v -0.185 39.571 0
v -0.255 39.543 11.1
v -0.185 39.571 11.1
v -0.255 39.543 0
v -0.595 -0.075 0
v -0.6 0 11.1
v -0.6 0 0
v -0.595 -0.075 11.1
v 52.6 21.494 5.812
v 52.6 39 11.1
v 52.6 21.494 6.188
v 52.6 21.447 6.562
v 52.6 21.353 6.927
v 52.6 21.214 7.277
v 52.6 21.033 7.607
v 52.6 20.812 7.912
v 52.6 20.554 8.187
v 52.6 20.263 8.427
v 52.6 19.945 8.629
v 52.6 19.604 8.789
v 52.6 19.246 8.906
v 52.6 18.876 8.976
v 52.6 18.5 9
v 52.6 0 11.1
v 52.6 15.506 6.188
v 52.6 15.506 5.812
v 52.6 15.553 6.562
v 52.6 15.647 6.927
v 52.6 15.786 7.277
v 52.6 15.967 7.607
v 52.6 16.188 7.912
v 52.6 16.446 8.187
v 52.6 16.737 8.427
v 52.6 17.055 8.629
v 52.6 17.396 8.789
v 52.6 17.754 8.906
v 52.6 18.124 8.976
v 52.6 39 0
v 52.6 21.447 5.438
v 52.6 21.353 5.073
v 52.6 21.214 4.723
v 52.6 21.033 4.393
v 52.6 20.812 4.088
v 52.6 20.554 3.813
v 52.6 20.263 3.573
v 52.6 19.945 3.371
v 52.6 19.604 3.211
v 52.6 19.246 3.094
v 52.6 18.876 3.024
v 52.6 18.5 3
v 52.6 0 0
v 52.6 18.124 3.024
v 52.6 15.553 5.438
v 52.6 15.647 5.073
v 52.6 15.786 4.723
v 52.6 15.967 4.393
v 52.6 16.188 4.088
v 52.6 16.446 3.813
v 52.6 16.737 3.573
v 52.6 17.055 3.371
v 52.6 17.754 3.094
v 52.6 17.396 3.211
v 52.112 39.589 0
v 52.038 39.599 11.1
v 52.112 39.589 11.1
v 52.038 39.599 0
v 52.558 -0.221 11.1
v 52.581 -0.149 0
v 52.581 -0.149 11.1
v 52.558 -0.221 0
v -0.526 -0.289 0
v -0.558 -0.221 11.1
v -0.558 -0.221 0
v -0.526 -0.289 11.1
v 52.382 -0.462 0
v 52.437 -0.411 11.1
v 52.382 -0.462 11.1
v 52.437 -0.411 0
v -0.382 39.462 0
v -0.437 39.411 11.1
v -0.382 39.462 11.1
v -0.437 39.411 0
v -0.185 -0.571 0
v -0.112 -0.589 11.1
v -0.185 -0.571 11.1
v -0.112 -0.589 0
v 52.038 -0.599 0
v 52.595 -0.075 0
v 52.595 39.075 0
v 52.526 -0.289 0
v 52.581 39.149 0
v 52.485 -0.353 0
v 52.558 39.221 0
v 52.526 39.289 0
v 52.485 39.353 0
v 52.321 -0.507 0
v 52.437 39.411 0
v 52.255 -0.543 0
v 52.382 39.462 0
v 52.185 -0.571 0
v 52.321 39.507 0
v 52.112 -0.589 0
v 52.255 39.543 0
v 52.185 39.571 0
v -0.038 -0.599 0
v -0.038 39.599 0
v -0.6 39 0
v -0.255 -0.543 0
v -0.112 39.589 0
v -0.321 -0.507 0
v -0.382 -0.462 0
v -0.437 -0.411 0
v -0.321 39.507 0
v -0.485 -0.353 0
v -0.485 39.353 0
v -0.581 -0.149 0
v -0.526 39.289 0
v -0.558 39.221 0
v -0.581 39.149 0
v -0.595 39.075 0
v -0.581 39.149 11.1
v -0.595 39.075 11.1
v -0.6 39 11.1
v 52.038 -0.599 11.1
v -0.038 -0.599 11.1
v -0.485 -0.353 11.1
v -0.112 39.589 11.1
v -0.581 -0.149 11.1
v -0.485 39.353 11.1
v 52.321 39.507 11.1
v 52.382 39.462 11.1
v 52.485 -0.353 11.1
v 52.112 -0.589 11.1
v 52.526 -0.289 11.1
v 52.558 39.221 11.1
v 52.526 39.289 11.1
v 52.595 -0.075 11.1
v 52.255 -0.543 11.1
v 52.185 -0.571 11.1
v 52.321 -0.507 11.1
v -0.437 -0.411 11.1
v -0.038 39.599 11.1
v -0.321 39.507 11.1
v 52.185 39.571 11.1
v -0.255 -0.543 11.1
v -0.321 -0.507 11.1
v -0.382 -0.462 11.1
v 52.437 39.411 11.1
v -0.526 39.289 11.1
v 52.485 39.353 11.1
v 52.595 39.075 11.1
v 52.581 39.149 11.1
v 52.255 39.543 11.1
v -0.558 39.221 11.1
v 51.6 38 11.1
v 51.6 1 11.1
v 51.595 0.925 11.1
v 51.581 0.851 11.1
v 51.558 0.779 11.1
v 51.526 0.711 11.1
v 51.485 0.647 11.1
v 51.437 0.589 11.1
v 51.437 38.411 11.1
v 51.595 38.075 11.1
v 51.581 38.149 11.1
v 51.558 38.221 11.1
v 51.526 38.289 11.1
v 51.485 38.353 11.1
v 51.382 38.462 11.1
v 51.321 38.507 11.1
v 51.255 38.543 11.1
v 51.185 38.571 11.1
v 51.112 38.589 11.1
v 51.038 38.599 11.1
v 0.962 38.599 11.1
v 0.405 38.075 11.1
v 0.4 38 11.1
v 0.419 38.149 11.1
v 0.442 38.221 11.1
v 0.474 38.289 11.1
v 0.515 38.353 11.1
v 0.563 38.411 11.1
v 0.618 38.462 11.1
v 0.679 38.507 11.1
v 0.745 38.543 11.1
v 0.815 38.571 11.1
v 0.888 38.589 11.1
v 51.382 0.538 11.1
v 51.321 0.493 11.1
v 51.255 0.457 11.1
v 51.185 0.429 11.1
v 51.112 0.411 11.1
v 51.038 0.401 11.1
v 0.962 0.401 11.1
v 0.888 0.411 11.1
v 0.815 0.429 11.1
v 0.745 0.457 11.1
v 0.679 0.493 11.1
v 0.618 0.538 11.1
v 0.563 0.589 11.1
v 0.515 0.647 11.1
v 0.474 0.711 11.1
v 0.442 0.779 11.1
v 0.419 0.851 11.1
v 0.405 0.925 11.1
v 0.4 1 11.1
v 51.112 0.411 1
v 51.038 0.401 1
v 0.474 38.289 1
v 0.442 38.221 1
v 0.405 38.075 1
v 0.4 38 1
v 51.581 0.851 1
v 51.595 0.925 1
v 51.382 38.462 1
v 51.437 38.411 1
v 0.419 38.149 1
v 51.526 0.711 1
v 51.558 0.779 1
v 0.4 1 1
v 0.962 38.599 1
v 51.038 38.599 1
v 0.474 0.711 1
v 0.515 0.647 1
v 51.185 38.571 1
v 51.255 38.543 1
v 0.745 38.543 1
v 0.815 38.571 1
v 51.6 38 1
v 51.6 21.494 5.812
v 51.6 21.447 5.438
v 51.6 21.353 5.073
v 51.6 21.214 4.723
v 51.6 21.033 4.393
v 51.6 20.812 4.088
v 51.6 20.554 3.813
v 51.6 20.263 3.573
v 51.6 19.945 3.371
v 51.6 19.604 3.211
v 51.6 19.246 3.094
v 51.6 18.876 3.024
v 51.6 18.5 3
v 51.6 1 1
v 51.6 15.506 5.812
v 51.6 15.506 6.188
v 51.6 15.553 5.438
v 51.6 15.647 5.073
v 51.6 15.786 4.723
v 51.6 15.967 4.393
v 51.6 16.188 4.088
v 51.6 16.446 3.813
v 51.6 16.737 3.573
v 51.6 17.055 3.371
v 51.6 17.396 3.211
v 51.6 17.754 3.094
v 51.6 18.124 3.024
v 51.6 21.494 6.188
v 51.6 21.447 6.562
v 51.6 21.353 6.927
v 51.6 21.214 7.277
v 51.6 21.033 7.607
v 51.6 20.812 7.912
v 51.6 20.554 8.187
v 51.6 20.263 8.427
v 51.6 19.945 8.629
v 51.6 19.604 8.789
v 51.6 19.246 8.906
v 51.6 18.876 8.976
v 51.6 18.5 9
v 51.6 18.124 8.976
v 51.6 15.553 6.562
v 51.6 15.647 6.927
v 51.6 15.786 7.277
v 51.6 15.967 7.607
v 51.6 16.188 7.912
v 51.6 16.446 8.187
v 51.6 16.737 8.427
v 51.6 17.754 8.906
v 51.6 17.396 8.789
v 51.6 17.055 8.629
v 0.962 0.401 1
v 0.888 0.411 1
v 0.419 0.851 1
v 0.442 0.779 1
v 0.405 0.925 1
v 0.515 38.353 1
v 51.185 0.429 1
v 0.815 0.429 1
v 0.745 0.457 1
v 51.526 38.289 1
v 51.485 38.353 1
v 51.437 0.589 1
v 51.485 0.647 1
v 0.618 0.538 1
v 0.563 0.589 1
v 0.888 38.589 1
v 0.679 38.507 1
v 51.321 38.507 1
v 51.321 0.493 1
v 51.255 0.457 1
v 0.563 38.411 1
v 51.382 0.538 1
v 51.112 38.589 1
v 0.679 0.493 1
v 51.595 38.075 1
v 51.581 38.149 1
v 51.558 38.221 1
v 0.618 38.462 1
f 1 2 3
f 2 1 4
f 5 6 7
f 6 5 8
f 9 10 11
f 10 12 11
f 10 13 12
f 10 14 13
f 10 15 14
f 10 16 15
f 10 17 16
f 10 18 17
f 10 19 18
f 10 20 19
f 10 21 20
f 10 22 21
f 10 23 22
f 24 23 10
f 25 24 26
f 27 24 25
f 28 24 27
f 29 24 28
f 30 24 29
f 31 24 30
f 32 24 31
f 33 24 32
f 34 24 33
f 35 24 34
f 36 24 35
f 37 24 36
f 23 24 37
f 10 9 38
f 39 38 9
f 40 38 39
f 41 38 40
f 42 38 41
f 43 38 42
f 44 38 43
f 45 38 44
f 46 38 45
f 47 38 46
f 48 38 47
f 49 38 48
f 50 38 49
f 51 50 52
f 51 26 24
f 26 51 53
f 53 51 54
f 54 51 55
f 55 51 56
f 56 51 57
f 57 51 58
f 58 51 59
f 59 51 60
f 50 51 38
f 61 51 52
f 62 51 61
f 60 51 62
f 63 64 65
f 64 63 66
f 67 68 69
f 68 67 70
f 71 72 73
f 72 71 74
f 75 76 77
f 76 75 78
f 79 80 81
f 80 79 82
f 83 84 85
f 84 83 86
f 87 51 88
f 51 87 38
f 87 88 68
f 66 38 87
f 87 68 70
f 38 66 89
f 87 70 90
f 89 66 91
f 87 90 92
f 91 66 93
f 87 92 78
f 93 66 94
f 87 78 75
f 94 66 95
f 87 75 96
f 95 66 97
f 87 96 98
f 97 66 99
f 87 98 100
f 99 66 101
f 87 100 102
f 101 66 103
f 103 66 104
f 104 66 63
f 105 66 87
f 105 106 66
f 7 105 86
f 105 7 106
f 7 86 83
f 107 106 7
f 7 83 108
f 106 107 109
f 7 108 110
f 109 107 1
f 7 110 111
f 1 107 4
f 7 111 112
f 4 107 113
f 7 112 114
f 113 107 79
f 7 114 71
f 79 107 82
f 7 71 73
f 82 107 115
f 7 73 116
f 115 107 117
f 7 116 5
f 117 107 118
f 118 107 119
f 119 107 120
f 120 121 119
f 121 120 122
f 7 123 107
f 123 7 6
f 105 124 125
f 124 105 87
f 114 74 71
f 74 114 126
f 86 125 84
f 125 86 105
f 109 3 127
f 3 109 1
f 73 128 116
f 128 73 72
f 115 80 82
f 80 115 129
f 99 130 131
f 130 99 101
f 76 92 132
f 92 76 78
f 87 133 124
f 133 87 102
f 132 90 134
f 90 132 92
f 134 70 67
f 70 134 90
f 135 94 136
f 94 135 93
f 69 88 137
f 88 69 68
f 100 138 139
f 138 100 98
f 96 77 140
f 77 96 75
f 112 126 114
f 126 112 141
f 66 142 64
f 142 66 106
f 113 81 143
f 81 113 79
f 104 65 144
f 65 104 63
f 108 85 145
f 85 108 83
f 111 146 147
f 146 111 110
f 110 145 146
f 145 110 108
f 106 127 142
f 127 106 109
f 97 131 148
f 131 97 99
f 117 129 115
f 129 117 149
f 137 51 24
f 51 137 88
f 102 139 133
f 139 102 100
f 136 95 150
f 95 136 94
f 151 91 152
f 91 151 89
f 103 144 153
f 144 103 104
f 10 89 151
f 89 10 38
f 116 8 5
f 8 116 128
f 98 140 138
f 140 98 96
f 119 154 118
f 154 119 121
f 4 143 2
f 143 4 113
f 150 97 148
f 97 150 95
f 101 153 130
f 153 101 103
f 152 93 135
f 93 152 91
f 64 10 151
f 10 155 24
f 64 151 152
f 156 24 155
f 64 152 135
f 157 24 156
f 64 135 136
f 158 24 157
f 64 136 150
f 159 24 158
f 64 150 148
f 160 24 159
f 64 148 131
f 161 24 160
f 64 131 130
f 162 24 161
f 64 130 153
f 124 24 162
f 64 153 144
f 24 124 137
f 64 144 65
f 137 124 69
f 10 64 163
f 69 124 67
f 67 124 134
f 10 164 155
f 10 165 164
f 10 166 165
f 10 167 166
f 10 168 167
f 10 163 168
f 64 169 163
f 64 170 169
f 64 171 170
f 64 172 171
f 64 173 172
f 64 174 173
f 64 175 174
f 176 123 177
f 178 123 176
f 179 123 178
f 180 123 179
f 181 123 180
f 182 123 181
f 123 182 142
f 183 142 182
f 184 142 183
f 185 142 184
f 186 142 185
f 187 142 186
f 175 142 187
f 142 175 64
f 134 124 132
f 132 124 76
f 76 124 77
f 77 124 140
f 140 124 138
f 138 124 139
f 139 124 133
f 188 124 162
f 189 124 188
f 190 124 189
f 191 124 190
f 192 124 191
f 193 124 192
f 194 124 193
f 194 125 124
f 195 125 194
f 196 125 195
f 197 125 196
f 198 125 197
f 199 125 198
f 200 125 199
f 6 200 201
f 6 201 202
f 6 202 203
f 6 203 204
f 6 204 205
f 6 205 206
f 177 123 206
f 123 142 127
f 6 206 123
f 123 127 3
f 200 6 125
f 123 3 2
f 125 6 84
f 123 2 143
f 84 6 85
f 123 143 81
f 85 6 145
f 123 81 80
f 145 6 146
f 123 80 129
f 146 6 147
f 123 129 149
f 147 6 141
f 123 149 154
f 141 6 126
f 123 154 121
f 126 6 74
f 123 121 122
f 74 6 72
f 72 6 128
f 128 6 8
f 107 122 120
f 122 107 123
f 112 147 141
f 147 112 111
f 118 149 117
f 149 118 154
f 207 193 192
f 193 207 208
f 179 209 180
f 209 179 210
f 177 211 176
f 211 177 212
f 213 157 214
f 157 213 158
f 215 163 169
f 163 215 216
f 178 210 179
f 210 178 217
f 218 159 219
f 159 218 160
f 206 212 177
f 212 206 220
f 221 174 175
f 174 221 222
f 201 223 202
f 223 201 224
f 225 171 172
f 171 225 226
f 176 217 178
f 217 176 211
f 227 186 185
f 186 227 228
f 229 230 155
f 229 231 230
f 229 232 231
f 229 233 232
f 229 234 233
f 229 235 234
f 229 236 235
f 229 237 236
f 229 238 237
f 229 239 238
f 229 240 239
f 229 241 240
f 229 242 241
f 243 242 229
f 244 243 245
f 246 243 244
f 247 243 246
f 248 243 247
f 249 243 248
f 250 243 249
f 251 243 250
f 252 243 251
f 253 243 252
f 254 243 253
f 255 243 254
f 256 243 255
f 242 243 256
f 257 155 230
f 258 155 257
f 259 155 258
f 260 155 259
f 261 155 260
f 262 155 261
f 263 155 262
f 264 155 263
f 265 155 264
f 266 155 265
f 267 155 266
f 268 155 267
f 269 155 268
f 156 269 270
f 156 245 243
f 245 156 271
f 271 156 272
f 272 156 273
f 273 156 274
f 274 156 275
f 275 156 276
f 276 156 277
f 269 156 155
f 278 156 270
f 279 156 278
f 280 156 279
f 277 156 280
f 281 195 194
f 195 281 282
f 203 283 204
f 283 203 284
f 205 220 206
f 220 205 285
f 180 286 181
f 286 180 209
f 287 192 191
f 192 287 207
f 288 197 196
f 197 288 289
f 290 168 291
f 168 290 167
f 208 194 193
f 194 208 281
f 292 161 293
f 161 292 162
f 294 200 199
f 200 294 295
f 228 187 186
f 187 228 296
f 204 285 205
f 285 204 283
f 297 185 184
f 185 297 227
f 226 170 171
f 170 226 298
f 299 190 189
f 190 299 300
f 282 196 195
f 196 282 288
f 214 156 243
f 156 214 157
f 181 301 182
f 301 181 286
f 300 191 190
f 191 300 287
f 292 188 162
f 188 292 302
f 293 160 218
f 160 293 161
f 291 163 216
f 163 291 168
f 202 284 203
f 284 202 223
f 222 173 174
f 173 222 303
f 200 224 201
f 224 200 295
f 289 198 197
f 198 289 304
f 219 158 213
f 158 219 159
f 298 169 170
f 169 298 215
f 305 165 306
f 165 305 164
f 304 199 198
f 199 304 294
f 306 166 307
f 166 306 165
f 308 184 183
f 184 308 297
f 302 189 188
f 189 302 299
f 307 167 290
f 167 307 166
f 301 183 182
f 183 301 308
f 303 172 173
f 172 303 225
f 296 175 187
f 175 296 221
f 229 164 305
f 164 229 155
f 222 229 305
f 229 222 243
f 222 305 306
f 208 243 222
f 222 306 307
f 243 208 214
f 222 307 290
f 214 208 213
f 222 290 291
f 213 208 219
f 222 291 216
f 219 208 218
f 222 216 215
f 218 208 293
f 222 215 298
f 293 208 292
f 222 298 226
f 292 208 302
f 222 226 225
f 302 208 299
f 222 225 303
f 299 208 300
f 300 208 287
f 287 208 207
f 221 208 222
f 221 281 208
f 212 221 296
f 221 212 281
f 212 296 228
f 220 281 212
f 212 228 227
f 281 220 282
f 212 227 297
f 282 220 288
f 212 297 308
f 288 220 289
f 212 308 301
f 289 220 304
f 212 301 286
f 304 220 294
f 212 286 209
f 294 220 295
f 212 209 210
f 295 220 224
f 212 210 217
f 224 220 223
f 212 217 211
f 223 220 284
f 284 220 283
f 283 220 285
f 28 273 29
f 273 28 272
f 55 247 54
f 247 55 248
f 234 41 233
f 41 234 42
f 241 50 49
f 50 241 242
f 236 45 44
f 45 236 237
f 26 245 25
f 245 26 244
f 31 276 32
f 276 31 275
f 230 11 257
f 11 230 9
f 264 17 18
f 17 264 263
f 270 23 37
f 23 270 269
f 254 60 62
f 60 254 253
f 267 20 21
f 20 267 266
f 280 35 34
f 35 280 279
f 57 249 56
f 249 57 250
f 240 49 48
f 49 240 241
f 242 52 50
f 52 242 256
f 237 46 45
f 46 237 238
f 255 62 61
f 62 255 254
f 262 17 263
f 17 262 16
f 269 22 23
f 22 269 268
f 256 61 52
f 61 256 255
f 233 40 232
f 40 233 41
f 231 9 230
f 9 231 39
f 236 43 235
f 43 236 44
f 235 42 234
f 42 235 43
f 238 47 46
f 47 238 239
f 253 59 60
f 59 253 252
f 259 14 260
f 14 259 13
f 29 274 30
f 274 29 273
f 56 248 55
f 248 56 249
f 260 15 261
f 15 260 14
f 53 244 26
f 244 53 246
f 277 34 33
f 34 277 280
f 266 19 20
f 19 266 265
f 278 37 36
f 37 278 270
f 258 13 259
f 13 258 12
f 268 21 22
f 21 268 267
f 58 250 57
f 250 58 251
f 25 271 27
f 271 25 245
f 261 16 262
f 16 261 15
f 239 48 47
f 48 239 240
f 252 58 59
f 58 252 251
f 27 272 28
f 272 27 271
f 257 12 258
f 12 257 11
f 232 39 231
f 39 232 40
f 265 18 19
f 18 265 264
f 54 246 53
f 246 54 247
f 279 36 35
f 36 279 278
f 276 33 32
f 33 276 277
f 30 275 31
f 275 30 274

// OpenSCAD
largo = 50;
ancho = 37;
alto = 10;
difference(){
    
    $fn=50;
minkowski()
{
   // translate([0,0,10]) 
cube([largo+2,ancho+2,alto+1],center=false);
cylinder(r=0.6,h=0.1);
}

  // translate([1,1,1]) 

      
minkowski()
{translate([1,1,1])
cube([largo,ancho,alto],center=false);
cylinder(r=0.6,h=1);
}
// translate([1,0.5,1]) 
///cube([largo,ancho,alto],center=false);


 translate([10,ancho/2,alto/2+1])
 rotate([0,90,0])
cylinder(r=3,h=largo);
//rotate([0,90,0])
// translate([50,12.5,alto/2])
//cube([5,12,2],center=false);


}
